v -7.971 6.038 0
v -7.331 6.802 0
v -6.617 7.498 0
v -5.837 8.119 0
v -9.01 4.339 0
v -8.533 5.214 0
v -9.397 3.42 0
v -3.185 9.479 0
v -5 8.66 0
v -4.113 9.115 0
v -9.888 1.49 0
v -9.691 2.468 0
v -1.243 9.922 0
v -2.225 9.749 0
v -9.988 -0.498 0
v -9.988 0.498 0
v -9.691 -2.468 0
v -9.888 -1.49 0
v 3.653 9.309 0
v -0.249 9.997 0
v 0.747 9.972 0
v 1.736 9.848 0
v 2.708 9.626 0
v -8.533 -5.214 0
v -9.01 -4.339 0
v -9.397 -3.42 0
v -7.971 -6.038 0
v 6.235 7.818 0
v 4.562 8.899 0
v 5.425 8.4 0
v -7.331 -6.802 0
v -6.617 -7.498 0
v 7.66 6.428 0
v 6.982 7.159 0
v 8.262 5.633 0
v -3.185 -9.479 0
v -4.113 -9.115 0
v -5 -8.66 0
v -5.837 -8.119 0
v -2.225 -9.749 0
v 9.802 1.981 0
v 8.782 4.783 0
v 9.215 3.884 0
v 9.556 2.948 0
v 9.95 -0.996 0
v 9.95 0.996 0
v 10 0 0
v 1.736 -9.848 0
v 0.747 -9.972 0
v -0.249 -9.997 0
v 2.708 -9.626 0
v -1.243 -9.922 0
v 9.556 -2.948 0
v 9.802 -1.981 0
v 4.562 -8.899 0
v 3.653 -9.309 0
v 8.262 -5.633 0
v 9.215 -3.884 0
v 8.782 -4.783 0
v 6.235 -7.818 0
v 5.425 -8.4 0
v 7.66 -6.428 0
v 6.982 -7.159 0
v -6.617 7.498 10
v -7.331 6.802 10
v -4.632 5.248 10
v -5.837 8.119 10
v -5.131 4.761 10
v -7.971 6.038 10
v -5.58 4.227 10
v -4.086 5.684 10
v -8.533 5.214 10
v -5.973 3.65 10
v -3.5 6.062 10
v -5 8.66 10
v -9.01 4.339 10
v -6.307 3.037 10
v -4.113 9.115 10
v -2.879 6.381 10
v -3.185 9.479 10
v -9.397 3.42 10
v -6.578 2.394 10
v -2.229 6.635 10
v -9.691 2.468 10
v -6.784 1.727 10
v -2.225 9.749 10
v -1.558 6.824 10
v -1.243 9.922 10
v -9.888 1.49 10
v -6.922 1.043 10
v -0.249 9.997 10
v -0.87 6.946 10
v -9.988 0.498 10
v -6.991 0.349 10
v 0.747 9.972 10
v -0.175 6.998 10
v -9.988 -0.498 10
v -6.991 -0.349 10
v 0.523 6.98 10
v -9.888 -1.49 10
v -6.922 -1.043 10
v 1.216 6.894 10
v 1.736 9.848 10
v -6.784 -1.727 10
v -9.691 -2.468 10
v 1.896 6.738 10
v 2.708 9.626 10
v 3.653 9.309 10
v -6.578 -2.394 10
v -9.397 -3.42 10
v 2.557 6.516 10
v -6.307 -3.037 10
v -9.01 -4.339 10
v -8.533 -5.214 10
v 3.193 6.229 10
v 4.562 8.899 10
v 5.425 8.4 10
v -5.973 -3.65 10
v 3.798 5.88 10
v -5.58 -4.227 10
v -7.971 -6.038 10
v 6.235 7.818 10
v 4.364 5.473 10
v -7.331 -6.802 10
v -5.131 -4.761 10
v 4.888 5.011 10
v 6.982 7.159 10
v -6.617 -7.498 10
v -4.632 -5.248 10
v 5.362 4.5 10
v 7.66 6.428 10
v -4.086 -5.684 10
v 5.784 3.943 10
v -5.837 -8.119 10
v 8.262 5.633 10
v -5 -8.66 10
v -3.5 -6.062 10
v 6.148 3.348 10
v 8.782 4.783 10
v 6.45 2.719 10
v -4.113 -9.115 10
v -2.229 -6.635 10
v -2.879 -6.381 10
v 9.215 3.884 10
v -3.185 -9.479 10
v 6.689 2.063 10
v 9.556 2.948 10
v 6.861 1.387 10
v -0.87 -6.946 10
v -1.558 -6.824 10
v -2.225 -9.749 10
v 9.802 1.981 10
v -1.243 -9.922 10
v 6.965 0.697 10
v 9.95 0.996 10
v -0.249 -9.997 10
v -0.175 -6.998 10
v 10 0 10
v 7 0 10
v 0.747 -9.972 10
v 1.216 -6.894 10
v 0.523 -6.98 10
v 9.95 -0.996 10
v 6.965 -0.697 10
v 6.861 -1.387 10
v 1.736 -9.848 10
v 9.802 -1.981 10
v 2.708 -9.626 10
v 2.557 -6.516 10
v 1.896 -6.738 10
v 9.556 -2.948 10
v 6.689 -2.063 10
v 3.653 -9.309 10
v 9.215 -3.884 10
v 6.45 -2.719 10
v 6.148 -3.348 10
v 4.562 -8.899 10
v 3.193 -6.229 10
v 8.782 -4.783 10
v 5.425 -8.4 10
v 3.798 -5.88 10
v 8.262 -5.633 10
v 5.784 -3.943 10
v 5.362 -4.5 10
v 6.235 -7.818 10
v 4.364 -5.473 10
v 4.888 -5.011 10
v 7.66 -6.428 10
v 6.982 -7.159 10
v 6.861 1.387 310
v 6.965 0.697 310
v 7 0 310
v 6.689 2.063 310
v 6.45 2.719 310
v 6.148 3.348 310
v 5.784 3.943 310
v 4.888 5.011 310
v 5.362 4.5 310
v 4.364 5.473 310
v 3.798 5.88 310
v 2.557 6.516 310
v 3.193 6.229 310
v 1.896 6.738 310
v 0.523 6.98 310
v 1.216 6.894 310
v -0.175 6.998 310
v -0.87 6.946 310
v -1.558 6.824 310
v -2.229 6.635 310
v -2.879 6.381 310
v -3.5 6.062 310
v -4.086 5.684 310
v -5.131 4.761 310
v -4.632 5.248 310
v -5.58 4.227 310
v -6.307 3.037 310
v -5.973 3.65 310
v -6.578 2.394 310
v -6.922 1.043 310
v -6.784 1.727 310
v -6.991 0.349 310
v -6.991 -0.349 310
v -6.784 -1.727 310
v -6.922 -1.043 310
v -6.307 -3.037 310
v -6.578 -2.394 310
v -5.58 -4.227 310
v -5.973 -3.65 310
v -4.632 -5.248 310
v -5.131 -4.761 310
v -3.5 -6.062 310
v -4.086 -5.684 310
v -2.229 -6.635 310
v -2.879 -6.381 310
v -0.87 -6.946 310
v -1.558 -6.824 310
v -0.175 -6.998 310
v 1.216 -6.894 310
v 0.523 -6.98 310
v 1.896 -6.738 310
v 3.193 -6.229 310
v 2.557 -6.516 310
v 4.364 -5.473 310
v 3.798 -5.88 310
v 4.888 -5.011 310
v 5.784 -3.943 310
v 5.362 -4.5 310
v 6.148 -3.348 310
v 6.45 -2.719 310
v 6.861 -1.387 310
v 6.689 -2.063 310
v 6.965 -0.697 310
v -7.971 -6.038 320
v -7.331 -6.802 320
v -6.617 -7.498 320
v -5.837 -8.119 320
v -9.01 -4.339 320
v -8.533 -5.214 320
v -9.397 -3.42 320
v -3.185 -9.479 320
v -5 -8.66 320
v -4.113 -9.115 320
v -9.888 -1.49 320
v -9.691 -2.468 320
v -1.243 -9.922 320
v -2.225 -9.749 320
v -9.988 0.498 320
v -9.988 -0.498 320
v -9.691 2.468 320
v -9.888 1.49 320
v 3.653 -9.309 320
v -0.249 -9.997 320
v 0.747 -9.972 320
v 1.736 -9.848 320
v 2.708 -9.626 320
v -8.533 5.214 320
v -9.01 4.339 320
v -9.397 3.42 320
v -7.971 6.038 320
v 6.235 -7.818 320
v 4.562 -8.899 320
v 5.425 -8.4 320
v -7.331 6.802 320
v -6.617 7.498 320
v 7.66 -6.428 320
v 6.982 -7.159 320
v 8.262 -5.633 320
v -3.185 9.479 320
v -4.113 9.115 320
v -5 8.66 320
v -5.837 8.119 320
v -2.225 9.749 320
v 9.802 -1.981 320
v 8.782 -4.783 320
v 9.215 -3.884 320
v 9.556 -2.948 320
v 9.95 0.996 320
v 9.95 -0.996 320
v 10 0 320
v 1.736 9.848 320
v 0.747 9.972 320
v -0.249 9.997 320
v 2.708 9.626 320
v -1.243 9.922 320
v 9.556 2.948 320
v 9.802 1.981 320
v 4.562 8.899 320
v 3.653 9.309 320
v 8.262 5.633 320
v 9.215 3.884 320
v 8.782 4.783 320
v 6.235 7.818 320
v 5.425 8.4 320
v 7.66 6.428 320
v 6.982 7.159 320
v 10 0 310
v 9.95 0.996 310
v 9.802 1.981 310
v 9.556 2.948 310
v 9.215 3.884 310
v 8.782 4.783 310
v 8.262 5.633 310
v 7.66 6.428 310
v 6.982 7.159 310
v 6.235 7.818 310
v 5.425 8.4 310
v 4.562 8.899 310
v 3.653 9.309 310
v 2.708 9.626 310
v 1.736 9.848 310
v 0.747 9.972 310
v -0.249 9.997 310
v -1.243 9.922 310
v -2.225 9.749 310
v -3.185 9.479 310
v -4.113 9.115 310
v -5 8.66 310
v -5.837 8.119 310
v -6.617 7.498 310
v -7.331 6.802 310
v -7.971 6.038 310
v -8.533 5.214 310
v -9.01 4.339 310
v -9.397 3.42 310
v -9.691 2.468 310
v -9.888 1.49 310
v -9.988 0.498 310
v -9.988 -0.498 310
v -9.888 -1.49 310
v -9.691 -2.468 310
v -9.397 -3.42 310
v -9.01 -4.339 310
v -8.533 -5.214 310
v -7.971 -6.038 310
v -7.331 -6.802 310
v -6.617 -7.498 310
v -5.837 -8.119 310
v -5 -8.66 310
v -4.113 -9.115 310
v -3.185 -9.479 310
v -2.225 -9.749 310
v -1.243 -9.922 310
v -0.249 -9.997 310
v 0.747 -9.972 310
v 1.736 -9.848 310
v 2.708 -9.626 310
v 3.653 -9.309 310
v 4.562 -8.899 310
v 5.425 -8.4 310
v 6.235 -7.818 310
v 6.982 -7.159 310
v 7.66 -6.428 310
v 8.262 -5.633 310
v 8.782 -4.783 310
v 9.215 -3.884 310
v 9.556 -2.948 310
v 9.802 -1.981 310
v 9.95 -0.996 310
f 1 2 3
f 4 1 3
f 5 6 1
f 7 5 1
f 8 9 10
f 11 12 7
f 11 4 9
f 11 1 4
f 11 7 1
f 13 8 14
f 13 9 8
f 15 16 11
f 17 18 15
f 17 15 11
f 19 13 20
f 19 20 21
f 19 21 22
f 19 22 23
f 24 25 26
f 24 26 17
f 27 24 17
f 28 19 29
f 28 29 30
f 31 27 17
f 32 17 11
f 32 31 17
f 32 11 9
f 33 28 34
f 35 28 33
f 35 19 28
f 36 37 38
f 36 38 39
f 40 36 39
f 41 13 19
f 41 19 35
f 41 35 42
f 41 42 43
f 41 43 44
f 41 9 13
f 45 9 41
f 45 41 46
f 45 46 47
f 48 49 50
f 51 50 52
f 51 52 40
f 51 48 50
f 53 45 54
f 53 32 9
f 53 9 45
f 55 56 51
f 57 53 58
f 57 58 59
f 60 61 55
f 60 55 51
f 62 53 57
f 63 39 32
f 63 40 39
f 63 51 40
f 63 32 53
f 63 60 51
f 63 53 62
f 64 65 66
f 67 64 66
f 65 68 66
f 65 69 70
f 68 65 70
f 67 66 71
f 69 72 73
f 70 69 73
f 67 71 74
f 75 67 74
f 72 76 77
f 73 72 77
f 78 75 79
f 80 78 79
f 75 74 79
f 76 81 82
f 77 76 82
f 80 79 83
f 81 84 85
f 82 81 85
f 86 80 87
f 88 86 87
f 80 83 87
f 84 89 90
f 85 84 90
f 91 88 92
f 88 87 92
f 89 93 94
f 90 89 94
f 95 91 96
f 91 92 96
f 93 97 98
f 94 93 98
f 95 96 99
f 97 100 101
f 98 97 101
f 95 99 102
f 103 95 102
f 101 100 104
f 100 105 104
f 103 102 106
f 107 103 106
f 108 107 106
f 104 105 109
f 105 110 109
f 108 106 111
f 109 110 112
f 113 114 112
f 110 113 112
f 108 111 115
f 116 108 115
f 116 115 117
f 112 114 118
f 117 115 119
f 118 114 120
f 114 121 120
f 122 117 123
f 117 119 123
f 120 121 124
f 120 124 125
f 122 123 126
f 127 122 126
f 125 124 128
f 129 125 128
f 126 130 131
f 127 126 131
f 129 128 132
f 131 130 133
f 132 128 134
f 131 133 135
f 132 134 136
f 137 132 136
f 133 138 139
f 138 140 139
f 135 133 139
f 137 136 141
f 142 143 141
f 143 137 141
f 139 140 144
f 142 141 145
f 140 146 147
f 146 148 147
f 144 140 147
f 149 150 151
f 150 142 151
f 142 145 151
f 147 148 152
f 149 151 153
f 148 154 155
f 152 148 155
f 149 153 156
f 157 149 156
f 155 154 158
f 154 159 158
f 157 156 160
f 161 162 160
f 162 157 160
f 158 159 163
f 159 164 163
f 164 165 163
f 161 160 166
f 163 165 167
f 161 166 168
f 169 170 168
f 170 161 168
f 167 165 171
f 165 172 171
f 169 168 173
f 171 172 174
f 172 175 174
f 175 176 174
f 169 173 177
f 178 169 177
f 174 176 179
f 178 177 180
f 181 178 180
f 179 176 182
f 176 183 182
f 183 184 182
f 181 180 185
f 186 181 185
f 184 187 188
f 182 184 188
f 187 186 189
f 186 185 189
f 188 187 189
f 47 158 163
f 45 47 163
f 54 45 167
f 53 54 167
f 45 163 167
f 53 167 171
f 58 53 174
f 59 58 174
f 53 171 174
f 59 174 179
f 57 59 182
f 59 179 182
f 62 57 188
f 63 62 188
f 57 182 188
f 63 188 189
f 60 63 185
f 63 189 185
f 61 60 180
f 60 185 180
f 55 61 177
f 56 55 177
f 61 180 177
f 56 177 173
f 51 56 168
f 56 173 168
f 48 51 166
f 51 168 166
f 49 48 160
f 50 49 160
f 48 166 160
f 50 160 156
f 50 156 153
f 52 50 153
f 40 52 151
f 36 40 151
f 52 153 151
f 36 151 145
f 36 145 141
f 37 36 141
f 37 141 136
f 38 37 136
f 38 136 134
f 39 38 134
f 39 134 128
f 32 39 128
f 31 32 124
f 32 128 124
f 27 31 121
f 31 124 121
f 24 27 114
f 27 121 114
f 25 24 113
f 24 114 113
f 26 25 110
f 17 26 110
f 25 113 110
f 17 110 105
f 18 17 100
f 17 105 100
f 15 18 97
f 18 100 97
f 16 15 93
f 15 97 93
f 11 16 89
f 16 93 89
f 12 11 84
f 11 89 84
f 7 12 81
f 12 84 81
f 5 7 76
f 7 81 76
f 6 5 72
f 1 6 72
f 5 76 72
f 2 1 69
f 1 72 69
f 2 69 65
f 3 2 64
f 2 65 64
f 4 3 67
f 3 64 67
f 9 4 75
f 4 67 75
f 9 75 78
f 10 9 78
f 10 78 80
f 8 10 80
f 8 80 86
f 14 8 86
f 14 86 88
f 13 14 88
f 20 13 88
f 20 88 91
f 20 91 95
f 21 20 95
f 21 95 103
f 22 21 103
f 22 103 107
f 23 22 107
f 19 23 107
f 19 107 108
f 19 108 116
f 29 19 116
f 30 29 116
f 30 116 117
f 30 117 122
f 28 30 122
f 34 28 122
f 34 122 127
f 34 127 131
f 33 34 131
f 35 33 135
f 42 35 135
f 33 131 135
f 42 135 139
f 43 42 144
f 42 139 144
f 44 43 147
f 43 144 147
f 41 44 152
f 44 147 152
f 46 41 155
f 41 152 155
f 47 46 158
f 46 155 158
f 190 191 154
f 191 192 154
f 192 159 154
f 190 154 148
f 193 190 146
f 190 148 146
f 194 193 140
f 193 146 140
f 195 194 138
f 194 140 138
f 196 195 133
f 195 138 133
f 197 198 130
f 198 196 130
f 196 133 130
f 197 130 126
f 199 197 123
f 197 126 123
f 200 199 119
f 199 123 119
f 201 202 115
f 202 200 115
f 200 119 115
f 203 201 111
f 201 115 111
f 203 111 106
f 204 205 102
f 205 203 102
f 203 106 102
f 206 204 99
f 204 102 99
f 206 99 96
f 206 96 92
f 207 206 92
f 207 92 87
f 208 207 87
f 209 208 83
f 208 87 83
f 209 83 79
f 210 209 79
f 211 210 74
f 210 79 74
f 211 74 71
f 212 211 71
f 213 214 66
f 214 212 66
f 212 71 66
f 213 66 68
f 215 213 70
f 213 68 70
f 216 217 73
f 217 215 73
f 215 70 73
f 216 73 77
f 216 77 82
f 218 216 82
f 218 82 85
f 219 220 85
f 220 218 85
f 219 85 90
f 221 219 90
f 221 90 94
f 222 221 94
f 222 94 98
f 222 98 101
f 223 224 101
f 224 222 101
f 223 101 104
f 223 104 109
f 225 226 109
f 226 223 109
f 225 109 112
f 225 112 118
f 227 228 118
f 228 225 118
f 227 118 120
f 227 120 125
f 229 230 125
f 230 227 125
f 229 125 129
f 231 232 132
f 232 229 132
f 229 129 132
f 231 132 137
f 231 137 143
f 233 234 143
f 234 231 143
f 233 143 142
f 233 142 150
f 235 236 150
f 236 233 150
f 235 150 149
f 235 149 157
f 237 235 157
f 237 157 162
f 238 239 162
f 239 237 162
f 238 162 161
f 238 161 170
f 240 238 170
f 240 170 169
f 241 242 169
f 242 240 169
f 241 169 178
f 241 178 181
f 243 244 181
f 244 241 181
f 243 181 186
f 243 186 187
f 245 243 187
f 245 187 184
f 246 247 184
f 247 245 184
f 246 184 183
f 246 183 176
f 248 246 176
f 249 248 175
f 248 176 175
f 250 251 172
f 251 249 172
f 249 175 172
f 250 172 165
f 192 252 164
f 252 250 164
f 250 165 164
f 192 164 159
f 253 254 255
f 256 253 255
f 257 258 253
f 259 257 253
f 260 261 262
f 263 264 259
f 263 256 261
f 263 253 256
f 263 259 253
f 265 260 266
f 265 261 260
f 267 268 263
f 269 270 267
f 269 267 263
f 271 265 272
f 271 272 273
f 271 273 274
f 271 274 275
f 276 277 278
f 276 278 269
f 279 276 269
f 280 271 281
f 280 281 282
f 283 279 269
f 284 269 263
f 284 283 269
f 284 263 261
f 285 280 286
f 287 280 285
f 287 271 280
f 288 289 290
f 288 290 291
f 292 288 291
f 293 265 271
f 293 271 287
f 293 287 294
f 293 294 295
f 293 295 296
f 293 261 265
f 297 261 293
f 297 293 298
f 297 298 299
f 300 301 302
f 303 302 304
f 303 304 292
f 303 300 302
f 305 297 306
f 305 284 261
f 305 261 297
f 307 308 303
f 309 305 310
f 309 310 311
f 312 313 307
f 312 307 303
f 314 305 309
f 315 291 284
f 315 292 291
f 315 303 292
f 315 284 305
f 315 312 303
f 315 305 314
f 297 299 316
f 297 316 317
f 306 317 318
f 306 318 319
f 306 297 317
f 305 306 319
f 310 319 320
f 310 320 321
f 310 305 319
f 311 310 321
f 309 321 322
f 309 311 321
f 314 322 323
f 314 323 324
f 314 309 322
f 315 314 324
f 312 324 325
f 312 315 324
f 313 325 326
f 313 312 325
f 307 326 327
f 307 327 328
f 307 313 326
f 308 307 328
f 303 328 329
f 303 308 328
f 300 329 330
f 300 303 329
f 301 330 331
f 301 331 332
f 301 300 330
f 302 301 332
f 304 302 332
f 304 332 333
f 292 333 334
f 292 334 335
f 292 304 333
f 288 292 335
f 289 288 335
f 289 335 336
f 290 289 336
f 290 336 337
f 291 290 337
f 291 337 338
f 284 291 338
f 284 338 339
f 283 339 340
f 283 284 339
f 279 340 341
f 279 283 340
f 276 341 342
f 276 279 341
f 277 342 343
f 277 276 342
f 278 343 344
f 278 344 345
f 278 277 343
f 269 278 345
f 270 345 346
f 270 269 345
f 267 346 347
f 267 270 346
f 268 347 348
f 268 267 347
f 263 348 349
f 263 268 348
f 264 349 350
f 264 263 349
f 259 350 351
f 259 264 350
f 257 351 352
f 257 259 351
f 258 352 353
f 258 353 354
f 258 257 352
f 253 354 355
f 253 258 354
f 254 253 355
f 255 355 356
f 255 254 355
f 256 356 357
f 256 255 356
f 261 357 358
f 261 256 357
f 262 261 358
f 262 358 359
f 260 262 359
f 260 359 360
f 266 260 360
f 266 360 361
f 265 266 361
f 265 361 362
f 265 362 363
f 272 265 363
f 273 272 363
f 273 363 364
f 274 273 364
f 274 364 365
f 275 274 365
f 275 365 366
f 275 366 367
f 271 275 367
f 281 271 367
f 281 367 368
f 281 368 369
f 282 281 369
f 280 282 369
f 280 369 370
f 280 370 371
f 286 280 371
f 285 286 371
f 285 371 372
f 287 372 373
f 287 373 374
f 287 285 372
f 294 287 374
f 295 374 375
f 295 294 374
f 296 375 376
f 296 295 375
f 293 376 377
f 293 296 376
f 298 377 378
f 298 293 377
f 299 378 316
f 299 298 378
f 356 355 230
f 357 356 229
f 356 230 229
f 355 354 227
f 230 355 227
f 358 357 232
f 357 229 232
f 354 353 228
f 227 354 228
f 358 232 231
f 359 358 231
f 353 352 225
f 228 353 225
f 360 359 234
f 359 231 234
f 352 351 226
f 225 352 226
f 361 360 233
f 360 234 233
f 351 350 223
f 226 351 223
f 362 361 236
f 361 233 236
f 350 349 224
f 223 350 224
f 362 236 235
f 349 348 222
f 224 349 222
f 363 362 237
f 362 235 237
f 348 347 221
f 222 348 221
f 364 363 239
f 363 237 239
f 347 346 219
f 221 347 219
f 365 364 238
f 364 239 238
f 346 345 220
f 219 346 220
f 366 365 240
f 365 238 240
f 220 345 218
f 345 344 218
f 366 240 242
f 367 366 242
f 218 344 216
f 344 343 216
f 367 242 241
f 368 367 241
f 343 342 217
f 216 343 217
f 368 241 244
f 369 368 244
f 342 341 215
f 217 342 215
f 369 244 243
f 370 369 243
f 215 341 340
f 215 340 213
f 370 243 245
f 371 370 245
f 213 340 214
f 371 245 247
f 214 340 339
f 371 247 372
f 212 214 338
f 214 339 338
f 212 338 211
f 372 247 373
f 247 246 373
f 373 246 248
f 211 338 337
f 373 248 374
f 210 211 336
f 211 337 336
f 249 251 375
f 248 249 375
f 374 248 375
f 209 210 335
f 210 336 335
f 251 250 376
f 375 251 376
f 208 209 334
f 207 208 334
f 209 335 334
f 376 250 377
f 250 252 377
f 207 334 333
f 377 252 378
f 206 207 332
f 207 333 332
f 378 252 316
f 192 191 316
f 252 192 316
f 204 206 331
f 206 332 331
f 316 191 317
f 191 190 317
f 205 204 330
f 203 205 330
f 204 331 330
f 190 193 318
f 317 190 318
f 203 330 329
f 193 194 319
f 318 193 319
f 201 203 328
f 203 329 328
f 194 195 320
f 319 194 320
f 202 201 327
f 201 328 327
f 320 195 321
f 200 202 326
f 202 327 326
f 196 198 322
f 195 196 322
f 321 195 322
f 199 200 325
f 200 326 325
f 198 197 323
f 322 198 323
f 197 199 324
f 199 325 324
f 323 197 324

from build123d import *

# Parameters (mm, degrees)
SKETCH1_R           = 7
BOSS_EXTRUDE1_DEPTH = 320
SKETCH2_R           = 10
BOSS_EXTRUDE2_DEPTH = 10
BOSS_EXTRUDE3_START = -10
SKETCH3_R           = 10
BOSS_EXTRUDE3_DEPTH = 10


with BuildPart() as part:
    # Sketch1 → Boss-Extrude1 (new body)
    with BuildSketch(Plane.XY):
        Circle(SKETCH1_R)
    extrude(amount=BOSS_EXTRUDE1_DEPTH)

    # Sketch2 → Boss-Extrude2 (add)
    with BuildSketch(Plane.XY.offset(320)):
        Circle(SKETCH2_R)
    extrude(amount=-BOSS_EXTRUDE2_DEPTH)

    # Sketch3 → Boss-Extrude3 (add)
    with BuildSketch(Plane(origin=(0, 0, 0), x_dir=(-1, 0, 0), z_dir=(0, 0, -1)).offset(BOSS_EXTRUDE3_START)):
        with Locations(Location((0, 0, 0), (0, 0, 180))):
            Circle(SKETCH3_R)
    extrude(amount=BOSS_EXTRUDE3_DEPTH)


solid = part.part
